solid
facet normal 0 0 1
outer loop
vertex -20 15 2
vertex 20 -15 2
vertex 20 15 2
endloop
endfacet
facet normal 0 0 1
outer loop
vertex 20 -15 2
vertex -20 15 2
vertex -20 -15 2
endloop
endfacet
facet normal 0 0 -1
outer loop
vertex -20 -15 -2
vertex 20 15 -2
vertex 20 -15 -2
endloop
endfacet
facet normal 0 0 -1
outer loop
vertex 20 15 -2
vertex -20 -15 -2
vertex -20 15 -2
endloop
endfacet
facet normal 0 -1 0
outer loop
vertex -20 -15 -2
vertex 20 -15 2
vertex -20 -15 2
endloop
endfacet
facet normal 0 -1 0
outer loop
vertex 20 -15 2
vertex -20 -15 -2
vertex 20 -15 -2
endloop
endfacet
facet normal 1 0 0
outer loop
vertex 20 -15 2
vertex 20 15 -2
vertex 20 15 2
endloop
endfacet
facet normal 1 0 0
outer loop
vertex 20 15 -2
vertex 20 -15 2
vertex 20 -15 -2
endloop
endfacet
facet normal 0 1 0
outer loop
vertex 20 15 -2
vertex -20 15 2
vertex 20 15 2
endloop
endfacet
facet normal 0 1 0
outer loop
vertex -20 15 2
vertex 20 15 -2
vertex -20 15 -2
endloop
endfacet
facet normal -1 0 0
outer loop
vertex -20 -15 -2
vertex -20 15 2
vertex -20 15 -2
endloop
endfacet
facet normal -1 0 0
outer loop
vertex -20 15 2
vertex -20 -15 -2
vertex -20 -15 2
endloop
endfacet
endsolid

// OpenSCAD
// Parameterised so -D overrides can be tested end to end.
plate_x = 40;
plate_y = 30;
plate_z = 4;

cube([plate_x, plate_y, plate_z], center = true);
